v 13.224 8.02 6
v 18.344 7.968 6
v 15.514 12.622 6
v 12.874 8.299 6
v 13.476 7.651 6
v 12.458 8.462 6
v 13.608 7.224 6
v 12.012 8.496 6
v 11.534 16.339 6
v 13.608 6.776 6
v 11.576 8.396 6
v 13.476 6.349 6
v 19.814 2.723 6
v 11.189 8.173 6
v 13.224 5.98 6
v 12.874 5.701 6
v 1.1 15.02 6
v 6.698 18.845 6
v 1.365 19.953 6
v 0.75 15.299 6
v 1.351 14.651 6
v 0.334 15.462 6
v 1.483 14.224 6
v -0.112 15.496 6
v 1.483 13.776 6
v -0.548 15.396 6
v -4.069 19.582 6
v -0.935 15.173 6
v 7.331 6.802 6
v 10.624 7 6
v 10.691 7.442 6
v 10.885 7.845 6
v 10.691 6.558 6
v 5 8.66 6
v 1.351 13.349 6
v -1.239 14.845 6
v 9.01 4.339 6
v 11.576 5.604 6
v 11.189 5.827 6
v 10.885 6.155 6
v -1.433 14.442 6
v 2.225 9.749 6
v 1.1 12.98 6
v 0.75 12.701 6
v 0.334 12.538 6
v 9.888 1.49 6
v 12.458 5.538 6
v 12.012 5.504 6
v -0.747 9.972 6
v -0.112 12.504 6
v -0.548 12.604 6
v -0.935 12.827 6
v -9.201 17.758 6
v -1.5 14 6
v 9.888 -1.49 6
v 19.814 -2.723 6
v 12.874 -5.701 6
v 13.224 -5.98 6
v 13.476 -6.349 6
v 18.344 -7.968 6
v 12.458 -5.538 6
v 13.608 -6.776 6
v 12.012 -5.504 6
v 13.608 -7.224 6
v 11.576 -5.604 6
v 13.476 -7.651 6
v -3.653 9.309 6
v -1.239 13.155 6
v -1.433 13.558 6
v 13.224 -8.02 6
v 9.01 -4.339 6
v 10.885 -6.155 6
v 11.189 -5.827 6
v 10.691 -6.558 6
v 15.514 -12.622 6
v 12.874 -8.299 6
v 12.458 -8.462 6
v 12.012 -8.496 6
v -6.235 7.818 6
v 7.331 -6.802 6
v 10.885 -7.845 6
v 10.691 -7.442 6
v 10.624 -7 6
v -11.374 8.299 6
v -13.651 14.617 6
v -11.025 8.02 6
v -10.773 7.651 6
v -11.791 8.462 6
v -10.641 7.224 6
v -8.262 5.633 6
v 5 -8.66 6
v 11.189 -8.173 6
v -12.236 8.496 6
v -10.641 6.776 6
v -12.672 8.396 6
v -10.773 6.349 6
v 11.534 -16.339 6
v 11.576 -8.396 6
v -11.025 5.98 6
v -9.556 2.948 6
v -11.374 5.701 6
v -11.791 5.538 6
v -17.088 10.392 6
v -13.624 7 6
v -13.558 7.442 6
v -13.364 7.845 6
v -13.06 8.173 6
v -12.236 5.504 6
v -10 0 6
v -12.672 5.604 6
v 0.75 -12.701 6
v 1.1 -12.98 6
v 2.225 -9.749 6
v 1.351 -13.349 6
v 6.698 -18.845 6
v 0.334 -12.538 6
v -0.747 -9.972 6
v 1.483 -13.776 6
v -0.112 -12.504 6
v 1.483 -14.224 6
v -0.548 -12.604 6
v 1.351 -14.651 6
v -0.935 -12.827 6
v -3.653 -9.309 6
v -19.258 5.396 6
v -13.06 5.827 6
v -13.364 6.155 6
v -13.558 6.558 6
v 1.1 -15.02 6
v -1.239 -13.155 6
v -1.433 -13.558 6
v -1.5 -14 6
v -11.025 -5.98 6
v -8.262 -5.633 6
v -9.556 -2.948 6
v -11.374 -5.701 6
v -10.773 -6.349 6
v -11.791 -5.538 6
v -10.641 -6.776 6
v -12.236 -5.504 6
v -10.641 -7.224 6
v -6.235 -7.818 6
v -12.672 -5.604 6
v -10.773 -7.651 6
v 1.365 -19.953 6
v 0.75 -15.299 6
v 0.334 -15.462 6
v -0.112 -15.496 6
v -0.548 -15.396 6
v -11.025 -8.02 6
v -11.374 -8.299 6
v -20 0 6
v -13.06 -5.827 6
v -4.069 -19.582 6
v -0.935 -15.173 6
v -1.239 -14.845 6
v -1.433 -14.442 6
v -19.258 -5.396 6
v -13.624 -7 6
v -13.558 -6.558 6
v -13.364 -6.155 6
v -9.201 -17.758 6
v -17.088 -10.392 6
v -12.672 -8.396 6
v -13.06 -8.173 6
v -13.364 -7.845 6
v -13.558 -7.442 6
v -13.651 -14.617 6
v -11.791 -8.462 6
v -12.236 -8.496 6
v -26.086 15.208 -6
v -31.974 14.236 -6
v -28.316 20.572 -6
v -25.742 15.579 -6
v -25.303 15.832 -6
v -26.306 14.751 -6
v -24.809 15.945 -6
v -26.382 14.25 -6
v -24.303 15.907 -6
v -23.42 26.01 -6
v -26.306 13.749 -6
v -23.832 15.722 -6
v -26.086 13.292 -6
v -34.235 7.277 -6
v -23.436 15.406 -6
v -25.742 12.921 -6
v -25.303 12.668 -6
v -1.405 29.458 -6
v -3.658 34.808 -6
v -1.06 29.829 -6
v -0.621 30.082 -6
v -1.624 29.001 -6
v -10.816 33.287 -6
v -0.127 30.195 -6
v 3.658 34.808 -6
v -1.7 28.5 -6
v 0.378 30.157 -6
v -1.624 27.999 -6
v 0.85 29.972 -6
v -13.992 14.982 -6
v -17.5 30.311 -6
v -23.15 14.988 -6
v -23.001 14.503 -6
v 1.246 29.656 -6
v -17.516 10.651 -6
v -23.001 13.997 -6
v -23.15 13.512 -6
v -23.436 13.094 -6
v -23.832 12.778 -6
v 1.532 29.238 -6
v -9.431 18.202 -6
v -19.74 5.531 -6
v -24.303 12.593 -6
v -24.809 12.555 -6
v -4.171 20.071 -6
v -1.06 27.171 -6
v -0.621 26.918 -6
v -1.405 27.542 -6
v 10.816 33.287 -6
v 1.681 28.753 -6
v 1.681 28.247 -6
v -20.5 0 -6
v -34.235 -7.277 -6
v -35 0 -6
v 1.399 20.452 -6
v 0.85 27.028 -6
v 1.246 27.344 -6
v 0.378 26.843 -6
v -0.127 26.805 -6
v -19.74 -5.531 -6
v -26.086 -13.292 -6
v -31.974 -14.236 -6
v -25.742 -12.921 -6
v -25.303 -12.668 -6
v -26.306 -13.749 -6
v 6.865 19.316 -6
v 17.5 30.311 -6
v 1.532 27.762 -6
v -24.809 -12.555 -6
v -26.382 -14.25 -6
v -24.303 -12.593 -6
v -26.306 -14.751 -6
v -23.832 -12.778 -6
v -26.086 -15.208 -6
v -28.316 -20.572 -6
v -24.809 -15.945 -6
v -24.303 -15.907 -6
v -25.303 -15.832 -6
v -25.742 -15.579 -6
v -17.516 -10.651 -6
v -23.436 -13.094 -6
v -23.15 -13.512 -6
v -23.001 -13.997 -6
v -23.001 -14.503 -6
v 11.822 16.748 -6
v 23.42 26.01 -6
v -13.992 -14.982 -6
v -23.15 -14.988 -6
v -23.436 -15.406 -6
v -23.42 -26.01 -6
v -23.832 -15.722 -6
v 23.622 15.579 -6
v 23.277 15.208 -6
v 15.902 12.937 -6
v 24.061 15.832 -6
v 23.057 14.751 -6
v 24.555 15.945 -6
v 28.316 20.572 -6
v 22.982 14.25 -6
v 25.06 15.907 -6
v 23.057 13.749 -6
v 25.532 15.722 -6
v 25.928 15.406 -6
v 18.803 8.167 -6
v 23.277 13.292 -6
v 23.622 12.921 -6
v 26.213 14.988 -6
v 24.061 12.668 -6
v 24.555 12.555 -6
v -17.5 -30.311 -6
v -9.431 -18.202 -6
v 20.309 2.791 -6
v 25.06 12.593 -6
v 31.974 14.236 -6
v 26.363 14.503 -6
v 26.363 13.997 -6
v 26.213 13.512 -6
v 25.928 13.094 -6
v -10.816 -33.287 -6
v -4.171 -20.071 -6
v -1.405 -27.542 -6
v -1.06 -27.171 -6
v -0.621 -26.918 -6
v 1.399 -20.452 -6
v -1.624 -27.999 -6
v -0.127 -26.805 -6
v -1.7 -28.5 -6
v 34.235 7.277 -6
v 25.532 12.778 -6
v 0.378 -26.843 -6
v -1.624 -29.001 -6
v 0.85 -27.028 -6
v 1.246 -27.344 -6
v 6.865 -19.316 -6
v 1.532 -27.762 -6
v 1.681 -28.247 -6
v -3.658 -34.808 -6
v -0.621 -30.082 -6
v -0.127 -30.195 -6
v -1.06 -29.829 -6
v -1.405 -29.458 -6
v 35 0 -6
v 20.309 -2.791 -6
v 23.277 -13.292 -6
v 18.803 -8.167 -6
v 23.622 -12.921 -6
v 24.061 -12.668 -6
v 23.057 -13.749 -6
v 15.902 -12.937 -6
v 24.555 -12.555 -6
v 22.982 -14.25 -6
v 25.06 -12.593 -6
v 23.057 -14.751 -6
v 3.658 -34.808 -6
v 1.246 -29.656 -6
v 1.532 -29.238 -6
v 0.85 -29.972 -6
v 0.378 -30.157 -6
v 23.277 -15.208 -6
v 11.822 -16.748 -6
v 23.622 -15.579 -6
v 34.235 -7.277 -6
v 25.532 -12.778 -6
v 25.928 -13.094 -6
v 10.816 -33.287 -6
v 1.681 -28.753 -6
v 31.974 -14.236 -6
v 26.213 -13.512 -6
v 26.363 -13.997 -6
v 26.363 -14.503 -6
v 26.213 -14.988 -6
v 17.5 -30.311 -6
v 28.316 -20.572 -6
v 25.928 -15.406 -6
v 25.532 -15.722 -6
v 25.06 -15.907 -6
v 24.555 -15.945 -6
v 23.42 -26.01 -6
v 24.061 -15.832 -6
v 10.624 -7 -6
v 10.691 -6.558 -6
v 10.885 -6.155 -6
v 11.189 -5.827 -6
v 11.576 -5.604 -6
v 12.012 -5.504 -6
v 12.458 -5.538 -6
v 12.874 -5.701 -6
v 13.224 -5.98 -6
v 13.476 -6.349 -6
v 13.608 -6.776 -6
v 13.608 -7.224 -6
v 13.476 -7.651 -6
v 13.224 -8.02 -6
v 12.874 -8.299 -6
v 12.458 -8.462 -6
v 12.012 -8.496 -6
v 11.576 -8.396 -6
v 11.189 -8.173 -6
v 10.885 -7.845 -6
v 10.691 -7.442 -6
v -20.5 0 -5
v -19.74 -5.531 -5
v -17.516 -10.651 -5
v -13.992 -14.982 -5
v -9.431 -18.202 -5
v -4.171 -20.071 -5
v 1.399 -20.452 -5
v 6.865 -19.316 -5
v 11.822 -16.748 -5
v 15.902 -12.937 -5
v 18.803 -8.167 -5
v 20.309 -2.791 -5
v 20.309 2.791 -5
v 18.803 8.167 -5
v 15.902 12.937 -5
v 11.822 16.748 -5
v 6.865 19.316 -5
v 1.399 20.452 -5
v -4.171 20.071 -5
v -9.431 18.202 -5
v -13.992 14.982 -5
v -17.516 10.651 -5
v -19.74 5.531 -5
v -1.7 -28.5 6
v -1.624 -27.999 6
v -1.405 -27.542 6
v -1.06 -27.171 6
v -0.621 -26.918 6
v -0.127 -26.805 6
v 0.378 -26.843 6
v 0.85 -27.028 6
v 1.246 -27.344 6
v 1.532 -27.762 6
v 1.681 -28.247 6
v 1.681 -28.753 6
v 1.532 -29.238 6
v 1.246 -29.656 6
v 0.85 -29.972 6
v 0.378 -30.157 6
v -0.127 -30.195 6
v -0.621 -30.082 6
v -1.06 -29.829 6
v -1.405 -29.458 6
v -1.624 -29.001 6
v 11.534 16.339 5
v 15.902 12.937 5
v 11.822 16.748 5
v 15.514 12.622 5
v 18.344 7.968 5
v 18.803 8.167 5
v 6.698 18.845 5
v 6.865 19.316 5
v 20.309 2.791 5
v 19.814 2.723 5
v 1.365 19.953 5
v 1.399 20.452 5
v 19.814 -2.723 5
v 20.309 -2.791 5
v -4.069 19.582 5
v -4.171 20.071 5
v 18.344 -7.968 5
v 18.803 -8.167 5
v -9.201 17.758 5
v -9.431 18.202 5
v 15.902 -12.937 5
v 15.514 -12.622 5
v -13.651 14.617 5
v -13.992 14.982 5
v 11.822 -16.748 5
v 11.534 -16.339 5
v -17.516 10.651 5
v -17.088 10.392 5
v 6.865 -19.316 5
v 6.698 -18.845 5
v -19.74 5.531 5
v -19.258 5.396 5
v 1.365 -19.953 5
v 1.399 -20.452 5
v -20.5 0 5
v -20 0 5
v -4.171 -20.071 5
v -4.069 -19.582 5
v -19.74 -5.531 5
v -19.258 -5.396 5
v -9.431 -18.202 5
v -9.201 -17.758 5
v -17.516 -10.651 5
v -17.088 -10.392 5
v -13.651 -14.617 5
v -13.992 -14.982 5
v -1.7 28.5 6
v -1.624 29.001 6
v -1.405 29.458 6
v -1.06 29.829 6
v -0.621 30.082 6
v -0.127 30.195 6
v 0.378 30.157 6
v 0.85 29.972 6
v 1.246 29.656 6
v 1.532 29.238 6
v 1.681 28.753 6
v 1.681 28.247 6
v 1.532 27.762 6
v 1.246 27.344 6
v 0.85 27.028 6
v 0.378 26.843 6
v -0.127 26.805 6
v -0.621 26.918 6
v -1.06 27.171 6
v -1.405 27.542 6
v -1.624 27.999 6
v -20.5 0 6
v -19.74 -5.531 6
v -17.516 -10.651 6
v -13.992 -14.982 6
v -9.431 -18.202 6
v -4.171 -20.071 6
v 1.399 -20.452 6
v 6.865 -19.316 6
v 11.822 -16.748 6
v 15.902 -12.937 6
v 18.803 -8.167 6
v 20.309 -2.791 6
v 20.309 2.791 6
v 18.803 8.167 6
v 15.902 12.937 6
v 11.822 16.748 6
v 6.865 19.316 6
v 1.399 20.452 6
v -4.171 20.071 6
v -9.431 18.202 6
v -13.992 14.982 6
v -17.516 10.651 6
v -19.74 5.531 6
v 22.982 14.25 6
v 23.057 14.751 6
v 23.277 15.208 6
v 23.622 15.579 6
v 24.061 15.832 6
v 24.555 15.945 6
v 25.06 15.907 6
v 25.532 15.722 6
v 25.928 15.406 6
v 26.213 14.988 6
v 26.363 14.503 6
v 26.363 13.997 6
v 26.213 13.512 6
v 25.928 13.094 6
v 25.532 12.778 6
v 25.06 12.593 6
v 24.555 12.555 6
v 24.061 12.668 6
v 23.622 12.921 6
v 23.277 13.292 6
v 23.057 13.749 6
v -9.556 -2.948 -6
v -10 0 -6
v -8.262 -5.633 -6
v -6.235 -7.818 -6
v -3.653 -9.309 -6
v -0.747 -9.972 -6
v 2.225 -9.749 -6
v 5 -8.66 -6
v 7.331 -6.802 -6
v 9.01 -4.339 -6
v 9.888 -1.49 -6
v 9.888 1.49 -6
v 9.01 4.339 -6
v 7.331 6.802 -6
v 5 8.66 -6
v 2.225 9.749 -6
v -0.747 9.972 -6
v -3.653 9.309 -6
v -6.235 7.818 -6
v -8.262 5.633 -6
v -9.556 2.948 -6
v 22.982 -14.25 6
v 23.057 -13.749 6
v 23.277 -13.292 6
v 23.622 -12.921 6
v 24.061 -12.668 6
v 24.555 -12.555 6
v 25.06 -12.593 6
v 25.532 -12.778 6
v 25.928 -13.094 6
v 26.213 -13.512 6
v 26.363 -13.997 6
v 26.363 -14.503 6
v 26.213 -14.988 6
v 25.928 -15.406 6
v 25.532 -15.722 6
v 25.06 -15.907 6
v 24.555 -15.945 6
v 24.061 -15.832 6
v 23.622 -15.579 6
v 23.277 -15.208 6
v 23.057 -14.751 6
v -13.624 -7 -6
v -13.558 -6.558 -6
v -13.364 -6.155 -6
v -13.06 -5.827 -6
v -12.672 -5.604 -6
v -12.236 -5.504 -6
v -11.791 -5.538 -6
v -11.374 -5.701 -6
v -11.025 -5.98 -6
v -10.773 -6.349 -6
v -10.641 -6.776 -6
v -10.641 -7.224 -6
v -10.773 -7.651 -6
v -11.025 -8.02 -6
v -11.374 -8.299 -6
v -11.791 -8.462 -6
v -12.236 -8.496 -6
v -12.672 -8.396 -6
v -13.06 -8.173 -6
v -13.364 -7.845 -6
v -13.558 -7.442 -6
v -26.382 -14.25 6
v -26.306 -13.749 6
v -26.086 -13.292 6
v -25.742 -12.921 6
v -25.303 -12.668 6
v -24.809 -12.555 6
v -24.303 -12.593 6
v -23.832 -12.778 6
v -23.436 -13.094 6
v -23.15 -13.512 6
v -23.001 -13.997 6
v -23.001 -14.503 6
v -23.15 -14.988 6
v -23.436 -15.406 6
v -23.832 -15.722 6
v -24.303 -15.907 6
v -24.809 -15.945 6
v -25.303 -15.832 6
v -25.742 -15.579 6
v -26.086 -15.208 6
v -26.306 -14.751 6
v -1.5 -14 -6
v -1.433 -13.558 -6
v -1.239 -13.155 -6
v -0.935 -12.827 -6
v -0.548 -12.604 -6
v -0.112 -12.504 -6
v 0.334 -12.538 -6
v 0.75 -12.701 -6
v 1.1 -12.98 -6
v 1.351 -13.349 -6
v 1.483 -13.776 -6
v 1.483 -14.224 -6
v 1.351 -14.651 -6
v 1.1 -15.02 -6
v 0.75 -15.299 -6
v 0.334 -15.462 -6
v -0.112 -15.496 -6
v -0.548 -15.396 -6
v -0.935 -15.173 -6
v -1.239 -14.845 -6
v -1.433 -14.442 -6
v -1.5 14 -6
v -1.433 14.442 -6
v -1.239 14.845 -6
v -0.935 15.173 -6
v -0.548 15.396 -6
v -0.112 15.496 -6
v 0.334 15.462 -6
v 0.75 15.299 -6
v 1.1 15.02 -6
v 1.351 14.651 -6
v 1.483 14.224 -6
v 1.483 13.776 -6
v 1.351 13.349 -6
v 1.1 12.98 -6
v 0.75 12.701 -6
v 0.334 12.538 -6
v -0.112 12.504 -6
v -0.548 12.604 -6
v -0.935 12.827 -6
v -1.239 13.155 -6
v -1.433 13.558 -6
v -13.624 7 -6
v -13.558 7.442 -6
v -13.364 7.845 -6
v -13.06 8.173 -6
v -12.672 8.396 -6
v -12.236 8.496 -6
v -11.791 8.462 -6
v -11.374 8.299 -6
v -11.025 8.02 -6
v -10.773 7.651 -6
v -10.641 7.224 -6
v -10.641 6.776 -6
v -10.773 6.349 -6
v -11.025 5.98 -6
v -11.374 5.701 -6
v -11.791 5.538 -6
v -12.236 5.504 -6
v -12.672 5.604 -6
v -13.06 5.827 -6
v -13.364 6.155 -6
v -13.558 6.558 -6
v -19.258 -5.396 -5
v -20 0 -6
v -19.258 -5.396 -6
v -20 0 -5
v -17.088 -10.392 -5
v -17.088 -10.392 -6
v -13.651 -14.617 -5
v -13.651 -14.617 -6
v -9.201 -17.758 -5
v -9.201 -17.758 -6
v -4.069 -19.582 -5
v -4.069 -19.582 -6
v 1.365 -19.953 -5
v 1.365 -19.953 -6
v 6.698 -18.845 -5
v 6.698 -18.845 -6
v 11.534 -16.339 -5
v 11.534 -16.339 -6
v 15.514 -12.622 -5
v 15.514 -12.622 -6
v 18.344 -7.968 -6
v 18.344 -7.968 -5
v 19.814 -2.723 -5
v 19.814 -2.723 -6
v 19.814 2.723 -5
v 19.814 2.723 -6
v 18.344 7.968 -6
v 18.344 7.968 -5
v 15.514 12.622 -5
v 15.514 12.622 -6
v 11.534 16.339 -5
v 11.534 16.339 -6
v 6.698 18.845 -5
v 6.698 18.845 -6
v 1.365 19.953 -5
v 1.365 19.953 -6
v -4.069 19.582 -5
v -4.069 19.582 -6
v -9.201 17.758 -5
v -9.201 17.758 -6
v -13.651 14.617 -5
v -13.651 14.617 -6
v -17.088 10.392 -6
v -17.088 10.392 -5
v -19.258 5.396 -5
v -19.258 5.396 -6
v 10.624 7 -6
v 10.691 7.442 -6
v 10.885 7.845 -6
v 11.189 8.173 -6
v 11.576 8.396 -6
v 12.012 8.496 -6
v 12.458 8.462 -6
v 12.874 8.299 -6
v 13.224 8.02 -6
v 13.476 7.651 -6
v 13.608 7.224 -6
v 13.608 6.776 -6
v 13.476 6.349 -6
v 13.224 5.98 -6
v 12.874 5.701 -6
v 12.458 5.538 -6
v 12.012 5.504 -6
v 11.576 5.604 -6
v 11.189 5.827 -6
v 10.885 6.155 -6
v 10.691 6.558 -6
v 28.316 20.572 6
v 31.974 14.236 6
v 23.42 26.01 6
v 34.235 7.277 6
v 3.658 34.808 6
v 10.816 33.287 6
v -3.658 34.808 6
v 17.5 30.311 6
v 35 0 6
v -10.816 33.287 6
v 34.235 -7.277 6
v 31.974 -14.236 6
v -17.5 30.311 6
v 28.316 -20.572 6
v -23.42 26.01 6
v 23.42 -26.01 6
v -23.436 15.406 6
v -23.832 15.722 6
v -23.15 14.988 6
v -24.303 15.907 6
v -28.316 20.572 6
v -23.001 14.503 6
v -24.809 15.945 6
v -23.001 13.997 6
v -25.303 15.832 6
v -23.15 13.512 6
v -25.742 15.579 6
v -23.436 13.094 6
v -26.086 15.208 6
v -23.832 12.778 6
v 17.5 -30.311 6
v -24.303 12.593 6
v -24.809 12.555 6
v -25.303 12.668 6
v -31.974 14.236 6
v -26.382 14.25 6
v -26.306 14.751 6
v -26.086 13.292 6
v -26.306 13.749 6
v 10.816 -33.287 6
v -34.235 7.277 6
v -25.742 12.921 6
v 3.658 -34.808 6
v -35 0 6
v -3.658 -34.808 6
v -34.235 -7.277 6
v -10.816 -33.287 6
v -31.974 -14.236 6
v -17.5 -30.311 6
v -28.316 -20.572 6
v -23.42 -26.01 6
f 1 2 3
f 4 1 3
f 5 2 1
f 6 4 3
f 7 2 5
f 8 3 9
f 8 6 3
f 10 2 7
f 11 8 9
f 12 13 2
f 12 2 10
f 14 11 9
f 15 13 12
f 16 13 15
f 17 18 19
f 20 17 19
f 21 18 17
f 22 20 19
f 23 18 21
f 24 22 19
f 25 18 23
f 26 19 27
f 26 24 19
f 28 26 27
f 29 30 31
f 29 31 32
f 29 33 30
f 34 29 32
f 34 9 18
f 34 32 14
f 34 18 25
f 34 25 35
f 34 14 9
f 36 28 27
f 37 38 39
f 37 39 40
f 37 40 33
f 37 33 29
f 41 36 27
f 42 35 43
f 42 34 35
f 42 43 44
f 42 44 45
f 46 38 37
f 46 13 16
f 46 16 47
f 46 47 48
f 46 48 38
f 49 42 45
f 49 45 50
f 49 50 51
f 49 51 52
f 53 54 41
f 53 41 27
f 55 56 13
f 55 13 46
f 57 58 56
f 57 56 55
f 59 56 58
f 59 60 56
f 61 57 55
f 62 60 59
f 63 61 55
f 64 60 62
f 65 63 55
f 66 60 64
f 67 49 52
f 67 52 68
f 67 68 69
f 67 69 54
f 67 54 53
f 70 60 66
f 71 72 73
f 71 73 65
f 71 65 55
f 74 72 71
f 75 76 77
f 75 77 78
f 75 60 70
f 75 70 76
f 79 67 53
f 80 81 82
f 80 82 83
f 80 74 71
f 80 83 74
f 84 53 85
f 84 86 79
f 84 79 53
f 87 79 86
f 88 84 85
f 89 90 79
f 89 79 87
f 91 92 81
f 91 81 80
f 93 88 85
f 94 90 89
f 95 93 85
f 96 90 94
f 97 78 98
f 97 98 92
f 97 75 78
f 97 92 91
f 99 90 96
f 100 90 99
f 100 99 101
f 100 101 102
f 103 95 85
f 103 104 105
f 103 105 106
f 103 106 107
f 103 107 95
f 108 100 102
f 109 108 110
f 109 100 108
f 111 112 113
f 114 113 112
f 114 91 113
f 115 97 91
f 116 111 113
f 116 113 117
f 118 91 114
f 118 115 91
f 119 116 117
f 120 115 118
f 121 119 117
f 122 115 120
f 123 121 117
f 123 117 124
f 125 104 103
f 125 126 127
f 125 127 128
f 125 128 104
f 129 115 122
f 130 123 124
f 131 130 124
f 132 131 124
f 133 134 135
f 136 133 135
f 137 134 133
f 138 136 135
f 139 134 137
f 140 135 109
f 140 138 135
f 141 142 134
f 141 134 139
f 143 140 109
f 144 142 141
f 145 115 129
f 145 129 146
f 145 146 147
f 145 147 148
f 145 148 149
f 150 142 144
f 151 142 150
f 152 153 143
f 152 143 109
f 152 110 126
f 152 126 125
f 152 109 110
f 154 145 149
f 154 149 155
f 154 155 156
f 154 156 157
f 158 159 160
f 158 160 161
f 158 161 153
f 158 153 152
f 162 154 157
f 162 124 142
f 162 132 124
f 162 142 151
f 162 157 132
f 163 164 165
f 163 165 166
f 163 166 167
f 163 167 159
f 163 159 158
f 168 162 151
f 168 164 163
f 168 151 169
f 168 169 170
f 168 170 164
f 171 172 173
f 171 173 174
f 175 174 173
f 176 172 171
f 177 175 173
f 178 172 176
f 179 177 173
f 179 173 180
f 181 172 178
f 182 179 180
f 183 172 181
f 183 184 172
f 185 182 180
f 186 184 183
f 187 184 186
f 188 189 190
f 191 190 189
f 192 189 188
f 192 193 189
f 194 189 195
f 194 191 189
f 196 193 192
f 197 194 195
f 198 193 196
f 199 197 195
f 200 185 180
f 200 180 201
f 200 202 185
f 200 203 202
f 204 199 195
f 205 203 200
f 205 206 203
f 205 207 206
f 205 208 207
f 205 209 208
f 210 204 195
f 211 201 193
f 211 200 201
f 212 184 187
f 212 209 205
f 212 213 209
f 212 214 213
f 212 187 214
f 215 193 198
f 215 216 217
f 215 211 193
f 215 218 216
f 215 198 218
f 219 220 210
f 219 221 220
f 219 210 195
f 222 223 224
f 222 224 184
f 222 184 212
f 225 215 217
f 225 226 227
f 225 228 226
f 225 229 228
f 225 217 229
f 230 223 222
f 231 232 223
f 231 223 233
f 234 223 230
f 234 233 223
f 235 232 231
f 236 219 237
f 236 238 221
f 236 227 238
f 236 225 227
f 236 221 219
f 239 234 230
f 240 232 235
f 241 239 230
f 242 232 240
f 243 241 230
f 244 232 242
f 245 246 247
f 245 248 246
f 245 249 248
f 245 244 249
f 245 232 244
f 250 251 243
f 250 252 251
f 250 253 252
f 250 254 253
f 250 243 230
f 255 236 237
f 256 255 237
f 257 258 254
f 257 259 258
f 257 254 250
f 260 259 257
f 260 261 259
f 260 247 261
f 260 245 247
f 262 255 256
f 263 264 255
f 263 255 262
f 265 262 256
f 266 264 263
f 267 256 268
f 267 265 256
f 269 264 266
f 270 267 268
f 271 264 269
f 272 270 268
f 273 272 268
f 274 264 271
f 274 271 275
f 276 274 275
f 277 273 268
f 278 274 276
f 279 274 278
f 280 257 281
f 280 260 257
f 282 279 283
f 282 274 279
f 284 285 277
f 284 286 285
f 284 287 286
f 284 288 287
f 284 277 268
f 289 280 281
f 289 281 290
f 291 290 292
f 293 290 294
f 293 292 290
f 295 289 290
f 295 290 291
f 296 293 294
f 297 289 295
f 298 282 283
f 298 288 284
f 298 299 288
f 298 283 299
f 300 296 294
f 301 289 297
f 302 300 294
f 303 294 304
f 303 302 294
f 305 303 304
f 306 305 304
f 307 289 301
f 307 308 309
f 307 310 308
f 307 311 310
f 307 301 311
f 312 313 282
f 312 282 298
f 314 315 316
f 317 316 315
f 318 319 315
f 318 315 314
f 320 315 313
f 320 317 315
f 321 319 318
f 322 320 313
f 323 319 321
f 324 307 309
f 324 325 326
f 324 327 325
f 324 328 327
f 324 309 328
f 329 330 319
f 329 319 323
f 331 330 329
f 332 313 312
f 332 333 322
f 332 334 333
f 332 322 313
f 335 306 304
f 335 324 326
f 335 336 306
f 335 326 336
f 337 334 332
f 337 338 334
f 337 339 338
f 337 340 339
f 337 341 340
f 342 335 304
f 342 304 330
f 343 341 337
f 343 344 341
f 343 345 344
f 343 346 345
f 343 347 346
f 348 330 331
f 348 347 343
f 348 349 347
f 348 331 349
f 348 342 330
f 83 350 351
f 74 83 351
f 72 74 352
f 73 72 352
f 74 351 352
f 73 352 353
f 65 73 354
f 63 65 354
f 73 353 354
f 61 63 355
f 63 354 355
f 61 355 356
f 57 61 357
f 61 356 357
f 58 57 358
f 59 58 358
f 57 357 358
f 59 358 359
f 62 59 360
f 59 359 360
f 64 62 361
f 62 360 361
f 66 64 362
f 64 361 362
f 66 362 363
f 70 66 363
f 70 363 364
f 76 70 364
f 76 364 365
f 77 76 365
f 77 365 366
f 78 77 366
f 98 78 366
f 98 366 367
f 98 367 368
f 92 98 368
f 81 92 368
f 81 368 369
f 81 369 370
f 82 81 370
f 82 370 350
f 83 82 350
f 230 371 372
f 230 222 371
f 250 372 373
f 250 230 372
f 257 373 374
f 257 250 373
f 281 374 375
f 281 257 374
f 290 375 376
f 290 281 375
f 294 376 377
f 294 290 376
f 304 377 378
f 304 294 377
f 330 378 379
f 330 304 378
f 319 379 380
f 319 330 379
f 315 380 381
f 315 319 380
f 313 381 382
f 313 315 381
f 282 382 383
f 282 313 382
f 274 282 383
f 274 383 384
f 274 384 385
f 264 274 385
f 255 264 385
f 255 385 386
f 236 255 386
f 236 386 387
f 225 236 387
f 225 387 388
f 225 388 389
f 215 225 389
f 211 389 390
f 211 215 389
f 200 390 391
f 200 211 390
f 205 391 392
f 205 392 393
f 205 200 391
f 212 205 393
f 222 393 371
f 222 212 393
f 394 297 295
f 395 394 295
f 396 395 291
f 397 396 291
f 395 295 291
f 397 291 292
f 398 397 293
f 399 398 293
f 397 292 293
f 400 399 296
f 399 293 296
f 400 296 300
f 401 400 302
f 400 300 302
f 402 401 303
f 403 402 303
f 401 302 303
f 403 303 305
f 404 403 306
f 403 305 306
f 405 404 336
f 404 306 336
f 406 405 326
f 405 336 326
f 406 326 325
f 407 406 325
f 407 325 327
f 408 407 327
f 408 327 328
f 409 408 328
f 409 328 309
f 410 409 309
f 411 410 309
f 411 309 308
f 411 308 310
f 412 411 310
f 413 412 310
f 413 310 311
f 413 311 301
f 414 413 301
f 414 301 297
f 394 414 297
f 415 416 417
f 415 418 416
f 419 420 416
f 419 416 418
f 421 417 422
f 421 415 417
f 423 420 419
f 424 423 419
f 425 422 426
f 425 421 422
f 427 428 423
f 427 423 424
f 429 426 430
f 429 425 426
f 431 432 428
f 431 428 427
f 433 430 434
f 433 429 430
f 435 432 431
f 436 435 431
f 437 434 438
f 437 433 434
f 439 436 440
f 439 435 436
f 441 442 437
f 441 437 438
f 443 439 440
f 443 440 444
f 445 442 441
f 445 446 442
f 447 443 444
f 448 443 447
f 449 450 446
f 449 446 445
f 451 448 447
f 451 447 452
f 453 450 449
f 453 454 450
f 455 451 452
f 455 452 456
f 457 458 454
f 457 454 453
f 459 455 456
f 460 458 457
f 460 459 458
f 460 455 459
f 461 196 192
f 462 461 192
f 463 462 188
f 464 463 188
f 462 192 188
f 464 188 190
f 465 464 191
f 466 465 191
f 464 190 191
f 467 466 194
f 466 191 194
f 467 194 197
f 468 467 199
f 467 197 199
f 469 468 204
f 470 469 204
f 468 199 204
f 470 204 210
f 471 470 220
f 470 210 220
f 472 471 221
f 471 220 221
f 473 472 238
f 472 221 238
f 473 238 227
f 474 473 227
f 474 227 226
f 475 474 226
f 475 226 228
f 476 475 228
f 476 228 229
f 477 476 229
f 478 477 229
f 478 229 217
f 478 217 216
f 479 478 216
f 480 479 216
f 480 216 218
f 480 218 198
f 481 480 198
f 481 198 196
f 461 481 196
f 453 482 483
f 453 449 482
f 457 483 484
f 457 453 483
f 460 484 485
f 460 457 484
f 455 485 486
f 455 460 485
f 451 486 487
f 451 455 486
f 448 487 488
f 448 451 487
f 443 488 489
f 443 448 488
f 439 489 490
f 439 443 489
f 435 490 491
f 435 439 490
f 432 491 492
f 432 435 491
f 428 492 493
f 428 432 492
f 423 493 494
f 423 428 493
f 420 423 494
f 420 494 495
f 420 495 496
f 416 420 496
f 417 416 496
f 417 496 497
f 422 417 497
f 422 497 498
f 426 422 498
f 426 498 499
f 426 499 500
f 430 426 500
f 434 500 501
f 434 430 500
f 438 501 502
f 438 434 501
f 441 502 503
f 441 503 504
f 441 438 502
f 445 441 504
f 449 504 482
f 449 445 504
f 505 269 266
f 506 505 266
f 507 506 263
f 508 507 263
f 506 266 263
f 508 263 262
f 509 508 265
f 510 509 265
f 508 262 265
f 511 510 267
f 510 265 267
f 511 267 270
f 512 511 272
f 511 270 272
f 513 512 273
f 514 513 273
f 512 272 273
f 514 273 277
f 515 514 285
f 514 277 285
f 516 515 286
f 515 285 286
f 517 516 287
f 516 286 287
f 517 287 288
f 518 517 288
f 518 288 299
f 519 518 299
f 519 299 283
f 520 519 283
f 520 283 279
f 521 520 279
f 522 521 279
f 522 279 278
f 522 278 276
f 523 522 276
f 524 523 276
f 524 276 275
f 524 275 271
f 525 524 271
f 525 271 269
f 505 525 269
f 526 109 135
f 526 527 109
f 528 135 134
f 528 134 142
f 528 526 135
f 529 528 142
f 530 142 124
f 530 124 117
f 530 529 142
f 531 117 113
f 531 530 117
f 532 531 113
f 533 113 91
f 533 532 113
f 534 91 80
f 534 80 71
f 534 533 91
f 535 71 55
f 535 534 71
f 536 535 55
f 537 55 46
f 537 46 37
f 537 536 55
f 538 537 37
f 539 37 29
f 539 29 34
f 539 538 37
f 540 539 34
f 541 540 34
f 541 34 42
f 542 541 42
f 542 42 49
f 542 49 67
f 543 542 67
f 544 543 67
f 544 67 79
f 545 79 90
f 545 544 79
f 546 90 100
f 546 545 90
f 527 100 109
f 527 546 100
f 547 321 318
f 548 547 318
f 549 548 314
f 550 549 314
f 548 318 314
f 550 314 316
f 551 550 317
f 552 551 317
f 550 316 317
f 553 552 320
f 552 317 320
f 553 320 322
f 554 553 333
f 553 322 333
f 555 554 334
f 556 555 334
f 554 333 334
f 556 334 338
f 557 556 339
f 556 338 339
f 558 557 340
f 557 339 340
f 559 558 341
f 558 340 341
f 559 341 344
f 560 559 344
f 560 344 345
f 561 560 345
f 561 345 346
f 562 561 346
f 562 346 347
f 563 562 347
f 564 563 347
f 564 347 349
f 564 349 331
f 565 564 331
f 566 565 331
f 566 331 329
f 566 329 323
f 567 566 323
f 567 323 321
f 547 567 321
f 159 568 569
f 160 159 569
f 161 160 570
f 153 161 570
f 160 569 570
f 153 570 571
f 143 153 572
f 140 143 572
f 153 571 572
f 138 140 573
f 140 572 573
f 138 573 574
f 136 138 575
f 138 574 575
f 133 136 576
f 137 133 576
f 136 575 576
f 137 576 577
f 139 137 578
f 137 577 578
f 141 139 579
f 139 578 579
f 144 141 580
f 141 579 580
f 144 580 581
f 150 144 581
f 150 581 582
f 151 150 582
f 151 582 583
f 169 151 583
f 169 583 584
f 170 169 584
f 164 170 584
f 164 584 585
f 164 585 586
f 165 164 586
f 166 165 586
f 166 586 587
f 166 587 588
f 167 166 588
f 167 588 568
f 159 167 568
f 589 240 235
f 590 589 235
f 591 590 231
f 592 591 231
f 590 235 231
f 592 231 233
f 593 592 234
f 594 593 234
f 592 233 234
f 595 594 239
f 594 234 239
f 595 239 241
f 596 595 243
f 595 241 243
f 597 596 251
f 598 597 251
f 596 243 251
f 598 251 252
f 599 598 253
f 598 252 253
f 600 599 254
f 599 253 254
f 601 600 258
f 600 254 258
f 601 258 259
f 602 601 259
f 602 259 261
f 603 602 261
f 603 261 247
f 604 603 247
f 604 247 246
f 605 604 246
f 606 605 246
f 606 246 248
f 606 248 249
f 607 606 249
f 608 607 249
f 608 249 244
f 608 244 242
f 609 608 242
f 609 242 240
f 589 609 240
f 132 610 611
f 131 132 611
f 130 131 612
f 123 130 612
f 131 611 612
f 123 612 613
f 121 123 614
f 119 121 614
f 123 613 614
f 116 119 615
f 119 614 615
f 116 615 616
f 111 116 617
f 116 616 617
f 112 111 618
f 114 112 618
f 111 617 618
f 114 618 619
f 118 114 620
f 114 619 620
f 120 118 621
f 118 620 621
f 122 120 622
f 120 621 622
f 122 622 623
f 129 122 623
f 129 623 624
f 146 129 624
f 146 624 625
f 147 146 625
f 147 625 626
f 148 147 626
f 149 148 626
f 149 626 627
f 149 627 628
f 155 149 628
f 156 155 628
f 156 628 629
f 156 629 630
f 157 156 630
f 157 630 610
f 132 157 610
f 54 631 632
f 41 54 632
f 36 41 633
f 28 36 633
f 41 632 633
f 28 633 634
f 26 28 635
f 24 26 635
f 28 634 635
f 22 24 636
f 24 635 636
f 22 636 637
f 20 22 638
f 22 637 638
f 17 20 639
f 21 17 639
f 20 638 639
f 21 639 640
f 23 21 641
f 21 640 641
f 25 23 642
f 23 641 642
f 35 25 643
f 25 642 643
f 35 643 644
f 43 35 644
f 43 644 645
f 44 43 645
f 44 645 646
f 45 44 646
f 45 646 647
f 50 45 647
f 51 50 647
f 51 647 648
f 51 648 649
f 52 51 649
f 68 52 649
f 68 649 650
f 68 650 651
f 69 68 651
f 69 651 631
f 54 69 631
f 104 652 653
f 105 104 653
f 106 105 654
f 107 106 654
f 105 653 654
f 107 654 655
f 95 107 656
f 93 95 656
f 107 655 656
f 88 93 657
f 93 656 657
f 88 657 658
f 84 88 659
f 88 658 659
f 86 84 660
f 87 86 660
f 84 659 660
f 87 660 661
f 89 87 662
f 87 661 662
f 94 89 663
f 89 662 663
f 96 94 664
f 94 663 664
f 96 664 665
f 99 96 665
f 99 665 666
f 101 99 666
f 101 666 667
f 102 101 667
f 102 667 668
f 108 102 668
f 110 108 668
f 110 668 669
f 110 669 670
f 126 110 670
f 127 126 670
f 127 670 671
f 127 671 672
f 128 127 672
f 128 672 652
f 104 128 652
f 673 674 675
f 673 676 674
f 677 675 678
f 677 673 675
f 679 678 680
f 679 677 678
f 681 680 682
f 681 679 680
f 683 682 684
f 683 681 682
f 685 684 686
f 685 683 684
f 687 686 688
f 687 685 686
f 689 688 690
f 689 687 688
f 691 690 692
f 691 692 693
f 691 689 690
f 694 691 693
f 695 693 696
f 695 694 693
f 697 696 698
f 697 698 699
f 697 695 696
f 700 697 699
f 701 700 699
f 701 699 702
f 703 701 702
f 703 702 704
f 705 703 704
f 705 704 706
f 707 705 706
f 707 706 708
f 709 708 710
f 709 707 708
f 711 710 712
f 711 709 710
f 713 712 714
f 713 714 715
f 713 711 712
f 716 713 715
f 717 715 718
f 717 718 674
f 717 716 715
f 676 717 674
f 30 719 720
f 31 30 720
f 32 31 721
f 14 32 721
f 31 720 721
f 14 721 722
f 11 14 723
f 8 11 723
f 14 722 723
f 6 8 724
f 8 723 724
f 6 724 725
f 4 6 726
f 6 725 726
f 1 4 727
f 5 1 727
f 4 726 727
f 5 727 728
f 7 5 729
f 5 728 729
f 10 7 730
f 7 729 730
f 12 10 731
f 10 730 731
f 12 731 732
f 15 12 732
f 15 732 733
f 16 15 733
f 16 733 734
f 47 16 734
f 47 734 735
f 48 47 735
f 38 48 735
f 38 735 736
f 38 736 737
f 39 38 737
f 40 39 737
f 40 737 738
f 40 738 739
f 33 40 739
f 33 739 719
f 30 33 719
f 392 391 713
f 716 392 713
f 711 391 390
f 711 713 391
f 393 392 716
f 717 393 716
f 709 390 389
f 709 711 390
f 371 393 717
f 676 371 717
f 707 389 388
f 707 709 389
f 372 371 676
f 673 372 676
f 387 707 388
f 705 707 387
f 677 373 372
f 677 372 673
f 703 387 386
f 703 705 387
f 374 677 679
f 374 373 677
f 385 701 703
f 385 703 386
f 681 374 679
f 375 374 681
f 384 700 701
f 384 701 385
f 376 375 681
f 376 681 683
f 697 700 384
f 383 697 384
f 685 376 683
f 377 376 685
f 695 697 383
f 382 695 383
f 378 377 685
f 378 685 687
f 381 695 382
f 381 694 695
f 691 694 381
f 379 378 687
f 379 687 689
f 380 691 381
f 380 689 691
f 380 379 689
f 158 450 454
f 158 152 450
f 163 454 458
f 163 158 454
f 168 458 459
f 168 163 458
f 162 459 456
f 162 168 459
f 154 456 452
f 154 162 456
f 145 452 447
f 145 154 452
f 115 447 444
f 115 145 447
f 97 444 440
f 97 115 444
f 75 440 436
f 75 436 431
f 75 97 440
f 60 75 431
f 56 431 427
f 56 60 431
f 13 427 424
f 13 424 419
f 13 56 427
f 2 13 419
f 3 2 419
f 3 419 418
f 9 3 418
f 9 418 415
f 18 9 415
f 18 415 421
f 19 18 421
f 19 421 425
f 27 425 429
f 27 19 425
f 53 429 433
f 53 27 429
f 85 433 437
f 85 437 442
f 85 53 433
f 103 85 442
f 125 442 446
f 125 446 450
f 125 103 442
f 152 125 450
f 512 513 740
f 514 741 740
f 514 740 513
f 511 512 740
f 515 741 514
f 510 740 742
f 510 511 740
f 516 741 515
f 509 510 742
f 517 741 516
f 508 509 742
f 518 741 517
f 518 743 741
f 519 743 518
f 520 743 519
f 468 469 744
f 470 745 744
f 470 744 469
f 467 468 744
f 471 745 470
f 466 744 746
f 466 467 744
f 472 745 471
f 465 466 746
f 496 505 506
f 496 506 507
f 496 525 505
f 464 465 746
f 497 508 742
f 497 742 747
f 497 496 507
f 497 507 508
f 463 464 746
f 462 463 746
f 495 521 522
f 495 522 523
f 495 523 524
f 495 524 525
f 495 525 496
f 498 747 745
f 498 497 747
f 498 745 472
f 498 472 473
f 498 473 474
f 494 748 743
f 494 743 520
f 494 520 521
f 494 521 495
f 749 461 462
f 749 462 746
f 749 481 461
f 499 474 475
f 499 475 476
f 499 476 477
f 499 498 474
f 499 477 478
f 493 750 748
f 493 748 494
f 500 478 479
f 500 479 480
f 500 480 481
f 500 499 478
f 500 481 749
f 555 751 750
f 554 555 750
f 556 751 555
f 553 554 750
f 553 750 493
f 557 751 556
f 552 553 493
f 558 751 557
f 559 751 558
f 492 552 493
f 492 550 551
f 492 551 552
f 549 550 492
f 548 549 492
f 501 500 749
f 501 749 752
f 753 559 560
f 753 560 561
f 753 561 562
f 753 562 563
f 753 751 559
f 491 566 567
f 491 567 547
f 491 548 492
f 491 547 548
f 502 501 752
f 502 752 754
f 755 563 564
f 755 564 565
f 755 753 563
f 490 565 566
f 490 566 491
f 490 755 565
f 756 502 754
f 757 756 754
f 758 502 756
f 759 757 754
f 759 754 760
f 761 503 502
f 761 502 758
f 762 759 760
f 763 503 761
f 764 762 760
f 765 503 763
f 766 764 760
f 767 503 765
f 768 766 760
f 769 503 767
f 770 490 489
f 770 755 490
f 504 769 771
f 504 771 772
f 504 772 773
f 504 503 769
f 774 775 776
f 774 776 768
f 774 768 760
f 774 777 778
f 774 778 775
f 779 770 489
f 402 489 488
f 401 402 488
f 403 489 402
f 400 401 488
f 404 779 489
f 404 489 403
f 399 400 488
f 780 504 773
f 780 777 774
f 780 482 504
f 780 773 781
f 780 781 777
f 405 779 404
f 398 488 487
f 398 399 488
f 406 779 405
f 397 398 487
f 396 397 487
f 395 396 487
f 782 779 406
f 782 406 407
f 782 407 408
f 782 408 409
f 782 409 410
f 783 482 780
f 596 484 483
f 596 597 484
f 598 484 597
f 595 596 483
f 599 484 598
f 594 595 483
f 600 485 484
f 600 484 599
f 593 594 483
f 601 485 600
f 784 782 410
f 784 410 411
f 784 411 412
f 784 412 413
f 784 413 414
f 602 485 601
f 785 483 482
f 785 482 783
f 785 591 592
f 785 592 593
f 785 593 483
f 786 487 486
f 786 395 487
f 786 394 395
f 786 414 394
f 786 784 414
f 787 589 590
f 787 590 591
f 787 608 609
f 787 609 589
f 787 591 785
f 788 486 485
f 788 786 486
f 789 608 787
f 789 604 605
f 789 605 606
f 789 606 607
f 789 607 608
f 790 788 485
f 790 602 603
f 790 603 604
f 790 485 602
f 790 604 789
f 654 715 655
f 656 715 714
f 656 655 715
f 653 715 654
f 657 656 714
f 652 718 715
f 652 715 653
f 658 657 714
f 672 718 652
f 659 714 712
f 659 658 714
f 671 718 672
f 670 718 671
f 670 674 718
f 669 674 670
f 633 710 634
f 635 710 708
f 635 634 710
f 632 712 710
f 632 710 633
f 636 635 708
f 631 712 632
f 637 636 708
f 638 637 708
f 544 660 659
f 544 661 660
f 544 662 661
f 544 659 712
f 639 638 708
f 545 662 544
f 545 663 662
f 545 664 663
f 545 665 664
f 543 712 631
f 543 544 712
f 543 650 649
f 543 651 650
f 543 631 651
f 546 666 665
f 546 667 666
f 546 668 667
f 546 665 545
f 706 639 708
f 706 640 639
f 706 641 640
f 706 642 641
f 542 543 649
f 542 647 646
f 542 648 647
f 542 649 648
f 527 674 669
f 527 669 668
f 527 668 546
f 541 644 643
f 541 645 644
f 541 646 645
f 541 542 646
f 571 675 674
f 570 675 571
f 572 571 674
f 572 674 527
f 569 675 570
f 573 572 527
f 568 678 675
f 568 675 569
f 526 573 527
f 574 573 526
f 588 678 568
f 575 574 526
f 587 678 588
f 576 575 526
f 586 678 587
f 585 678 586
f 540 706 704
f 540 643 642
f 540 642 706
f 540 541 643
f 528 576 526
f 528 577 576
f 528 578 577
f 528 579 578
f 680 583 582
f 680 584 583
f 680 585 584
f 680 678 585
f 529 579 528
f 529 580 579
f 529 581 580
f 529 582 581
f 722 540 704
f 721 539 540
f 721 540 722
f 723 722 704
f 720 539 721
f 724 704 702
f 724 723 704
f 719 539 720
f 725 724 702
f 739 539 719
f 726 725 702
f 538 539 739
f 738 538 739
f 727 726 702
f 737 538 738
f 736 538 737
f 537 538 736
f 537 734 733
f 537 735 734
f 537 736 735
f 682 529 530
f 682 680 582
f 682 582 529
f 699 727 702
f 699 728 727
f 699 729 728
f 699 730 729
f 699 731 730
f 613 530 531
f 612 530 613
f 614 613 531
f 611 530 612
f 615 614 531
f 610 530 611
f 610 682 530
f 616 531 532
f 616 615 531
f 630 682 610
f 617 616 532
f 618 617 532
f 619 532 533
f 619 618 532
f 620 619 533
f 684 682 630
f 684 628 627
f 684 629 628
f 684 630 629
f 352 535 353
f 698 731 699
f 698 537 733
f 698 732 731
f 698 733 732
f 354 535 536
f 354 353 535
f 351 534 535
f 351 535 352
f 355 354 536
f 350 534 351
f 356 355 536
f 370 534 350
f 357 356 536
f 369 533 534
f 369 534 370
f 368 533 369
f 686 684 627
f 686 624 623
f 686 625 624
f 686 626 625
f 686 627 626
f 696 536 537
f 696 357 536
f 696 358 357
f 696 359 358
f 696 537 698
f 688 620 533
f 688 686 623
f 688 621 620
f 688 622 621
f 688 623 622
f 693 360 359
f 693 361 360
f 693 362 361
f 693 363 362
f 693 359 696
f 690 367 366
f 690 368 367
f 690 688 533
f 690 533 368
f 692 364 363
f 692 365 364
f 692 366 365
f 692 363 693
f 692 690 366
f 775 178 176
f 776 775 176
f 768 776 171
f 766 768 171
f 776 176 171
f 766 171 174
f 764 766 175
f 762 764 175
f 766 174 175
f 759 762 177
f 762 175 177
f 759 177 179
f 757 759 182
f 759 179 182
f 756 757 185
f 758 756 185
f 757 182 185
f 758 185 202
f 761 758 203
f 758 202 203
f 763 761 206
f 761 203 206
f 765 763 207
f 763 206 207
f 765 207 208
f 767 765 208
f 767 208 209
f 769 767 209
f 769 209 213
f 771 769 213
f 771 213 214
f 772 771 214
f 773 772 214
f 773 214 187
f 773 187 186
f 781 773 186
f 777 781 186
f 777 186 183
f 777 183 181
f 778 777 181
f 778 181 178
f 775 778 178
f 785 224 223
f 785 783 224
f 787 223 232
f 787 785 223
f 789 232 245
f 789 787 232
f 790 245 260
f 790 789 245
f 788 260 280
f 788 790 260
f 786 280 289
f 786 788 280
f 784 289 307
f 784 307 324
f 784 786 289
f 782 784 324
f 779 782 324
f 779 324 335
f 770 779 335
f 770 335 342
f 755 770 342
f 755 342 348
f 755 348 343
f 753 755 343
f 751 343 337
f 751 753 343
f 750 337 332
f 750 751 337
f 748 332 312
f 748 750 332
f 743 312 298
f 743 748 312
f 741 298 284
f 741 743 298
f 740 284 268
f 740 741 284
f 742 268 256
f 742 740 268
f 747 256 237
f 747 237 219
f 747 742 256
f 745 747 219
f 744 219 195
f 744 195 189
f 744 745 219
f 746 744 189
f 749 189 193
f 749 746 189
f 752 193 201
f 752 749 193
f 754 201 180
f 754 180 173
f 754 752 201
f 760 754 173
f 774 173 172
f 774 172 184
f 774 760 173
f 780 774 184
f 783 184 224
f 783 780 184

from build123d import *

# Parameters (mm, degrees)
CUT_EXTRUDE_1_REACH = 52.931
SKETCH_2_R          = 1.7
SKETCH_2_R_2        = 1.5


with BuildPart() as part:
    # 草图1 → 旋转1 (revolve)
    with BuildSketch(Plane(origin=(0, 0, 0), x_dir=(1, 0, 0), z_dir=(0, 1, 0))):
        Polygon((10, 6), (20, 6), (20, 5), (20.5, 5), (20.5, 6), (35, 6), (35, -6), (20.5, -6), (20.5, -5), (20, -5), (20, -6), (10, -6), align=None)
    revolve(axis=Axis((0, 0, -11.223459705), (0, 0, 1)))

    # 草图2 → 切除-拉伸1 (cut, up to next)
    with BuildSketch(Plane(origin=(0, 0, -6), x_dir=(-1, 0, 0), z_dir=(0, 0, -1)), mode=Mode.PRIVATE) as cut_extrude_1_sk1:
        with Locations((0, 28.5)):
            Circle(SKETCH_2_R)
    cut_extrude_1_tool1 = extrude(cut_extrude_1_sk1.sketch, amount=-CUT_EXTRUDE_1_REACH, mode=Mode.PRIVATE) & part.part
    # 草图2 → 切除-拉伸1 (cut, up to next)
    with BuildSketch(Plane(origin=(0, 0, -6), x_dir=(-1, 0, 0), z_dir=(0, 0, -1)), mode=Mode.PRIVATE) as cut_extrude_1_sk2:
        with Locations((24.681724008, 14.25)):
            Circle(SKETCH_2_R)
    cut_extrude_1_tool2 = extrude(cut_extrude_1_sk2.sketch, amount=-CUT_EXTRUDE_1_REACH, mode=Mode.PRIVATE) & part.part
    # 草图2 → 切除-拉伸1 (cut, up to next)
    with BuildSketch(Plane(origin=(0, 0, -6), x_dir=(-1, 0, 0), z_dir=(0, 0, -1)), mode=Mode.PRIVATE) as cut_extrude_1_sk3:
        with Locations((24.681724008, -14.25)):
            Circle(SKETCH_2_R)
    cut_extrude_1_tool3 = extrude(cut_extrude_1_sk3.sketch, amount=-CUT_EXTRUDE_1_REACH, mode=Mode.PRIVATE) & part.part
    # 草图2 → 切除-拉伸1 (cut, up to next)
    with BuildSketch(Plane(origin=(0, 0, -6), x_dir=(-1, 0, 0), z_dir=(0, 0, -1)), mode=Mode.PRIVATE) as cut_extrude_1_sk4:
        with Locations((0, -28.5)):
            Circle(SKETCH_2_R)
    cut_extrude_1_tool4 = extrude(cut_extrude_1_sk4.sketch, amount=-CUT_EXTRUDE_1_REACH, mode=Mode.PRIVATE) & part.part
    # 草图2 → 切除-拉伸1 (cut, up to next)
    with BuildSketch(Plane(origin=(0, 0, -6), x_dir=(-1, 0, 0), z_dir=(0, 0, -1)), mode=Mode.PRIVATE) as cut_extrude_1_sk5:
        with Locations((-24.681724008, -14.25)):
            Circle(SKETCH_2_R)
    cut_extrude_1_tool5 = extrude(cut_extrude_1_sk5.sketch, amount=-CUT_EXTRUDE_1_REACH, mode=Mode.PRIVATE) & part.part
    # 草图2 → 切除-拉伸1 (cut, up to next)
    with BuildSketch(Plane(origin=(0, 0, -6), x_dir=(-1, 0, 0), z_dir=(0, 0, -1)), mode=Mode.PRIVATE) as cut_extrude_1_sk6:
        with Locations((-24.681724008, 14.25)):
            Circle(SKETCH_2_R)
    cut_extrude_1_tool6 = extrude(cut_extrude_1_sk6.sketch, amount=-CUT_EXTRUDE_1_REACH, mode=Mode.PRIVATE) & part.part
    # 草图2 → 切除-拉伸1 (cut, up to next)
    with BuildSketch(Plane(origin=(0, 0, -6), x_dir=(-1, 0, 0), z_dir=(0, 0, -1)), mode=Mode.PRIVATE) as cut_extrude_1_sk7:
        with Locations((0, 14)):
            Circle(SKETCH_2_R_2)
    cut_extrude_1_tool7 = extrude(cut_extrude_1_sk7.sketch, amount=-CUT_EXTRUDE_1_REACH, mode=Mode.PRIVATE) & part.part
    # 草图2 → 切除-拉伸1 (cut, up to next)
    with BuildSketch(Plane(origin=(0, 0, -6), x_dir=(-1, 0, 0), z_dir=(0, 0, -1)), mode=Mode.PRIVATE) as cut_extrude_1_sk8:
        with Locations((12.124355653, 7)):
            Circle(SKETCH_2_R_2)
    cut_extrude_1_tool8 = extrude(cut_extrude_1_sk8.sketch, amount=-CUT_EXTRUDE_1_REACH, mode=Mode.PRIVATE) & part.part
    # 草图2 → 切除-拉伸1 (cut, up to next)
    with BuildSketch(Plane(origin=(0, 0, -6), x_dir=(-1, 0, 0), z_dir=(0, 0, -1)), mode=Mode.PRIVATE) as cut_extrude_1_sk9:
        with Locations((12.124355653, -7)):
            Circle(SKETCH_2_R_2)
    cut_extrude_1_tool9 = extrude(cut_extrude_1_sk9.sketch, amount=-CUT_EXTRUDE_1_REACH, mode=Mode.PRIVATE) & part.part
    # 草图2 → 切除-拉伸1 (cut, up to next)
    with BuildSketch(Plane(origin=(0, 0, -6), x_dir=(-1, 0, 0), z_dir=(0, 0, -1)), mode=Mode.PRIVATE) as cut_extrude_1_sk10:
        with Locations((0, -14)):
            Circle(SKETCH_2_R_2)
    cut_extrude_1_tool10 = extrude(cut_extrude_1_sk10.sketch, amount=-CUT_EXTRUDE_1_REACH, mode=Mode.PRIVATE) & part.part
    # 草图2 → 切除-拉伸1 (cut, up to next)
    with BuildSketch(Plane(origin=(0, 0, -6), x_dir=(-1, 0, 0), z_dir=(0, 0, -1)), mode=Mode.PRIVATE) as cut_extrude_1_sk11:
        with Locations((-12.124355653, -7)):
            Circle(SKETCH_2_R_2)
    cut_extrude_1_tool11 = extrude(cut_extrude_1_sk11.sketch, amount=-CUT_EXTRUDE_1_REACH, mode=Mode.PRIVATE) & part.part
    # 草图2 → 切除-拉伸1 (cut, up to next)
    with BuildSketch(Plane(origin=(0, 0, -6), x_dir=(-1, 0, 0), z_dir=(0, 0, -1)), mode=Mode.PRIVATE) as cut_extrude_1_sk12:
        with Locations((-12.124355653, 7)):
            Circle(SKETCH_2_R_2)
    cut_extrude_1_tool12 = extrude(cut_extrude_1_sk12.sketch, amount=-CUT_EXTRUDE_1_REACH, mode=Mode.PRIVATE) & part.part
    add(cut_extrude_1_tool1.solids().sort_by_distance((0, 28.5, -6))[0], mode=Mode.SUBTRACT)
    add(cut_extrude_1_tool2.solids().sort_by_distance((-24.681724, 14.25, -6))[0], mode=Mode.SUBTRACT)
    add(cut_extrude_1_tool3.solids().sort_by_distance((-24.681724, -14.25, -6))[0], mode=Mode.SUBTRACT)
    add(cut_extrude_1_tool4.solids().sort_by_distance((0, -28.5, -6))[0], mode=Mode.SUBTRACT)
    add(cut_extrude_1_tool5.solids().sort_by_distance((24.681724, -14.25, -6))[0], mode=Mode.SUBTRACT)
    add(cut_extrude_1_tool6.solids().sort_by_distance((24.681724, 14.25, -6))[0], mode=Mode.SUBTRACT)
    add(cut_extrude_1_tool7.solids().sort_by_distance((0, 14, -6))[0], mode=Mode.SUBTRACT)
    add(cut_extrude_1_tool8.solids().sort_by_distance((-12.124356, 7, -6))[0], mode=Mode.SUBTRACT)
    add(cut_extrude_1_tool9.solids().sort_by_distance((-12.124356, -7, -6))[0], mode=Mode.SUBTRACT)
    add(cut_extrude_1_tool10.solids().sort_by_distance((0, -14, -6))[0], mode=Mode.SUBTRACT)
    add(cut_extrude_1_tool11.solids().sort_by_distance((12.124356, -7, -6))[0], mode=Mode.SUBTRACT)
    add(cut_extrude_1_tool12.solids().sort_by_distance((12.124356, 7, -6))[0], mode=Mode.SUBTRACT)


solid = part.part
